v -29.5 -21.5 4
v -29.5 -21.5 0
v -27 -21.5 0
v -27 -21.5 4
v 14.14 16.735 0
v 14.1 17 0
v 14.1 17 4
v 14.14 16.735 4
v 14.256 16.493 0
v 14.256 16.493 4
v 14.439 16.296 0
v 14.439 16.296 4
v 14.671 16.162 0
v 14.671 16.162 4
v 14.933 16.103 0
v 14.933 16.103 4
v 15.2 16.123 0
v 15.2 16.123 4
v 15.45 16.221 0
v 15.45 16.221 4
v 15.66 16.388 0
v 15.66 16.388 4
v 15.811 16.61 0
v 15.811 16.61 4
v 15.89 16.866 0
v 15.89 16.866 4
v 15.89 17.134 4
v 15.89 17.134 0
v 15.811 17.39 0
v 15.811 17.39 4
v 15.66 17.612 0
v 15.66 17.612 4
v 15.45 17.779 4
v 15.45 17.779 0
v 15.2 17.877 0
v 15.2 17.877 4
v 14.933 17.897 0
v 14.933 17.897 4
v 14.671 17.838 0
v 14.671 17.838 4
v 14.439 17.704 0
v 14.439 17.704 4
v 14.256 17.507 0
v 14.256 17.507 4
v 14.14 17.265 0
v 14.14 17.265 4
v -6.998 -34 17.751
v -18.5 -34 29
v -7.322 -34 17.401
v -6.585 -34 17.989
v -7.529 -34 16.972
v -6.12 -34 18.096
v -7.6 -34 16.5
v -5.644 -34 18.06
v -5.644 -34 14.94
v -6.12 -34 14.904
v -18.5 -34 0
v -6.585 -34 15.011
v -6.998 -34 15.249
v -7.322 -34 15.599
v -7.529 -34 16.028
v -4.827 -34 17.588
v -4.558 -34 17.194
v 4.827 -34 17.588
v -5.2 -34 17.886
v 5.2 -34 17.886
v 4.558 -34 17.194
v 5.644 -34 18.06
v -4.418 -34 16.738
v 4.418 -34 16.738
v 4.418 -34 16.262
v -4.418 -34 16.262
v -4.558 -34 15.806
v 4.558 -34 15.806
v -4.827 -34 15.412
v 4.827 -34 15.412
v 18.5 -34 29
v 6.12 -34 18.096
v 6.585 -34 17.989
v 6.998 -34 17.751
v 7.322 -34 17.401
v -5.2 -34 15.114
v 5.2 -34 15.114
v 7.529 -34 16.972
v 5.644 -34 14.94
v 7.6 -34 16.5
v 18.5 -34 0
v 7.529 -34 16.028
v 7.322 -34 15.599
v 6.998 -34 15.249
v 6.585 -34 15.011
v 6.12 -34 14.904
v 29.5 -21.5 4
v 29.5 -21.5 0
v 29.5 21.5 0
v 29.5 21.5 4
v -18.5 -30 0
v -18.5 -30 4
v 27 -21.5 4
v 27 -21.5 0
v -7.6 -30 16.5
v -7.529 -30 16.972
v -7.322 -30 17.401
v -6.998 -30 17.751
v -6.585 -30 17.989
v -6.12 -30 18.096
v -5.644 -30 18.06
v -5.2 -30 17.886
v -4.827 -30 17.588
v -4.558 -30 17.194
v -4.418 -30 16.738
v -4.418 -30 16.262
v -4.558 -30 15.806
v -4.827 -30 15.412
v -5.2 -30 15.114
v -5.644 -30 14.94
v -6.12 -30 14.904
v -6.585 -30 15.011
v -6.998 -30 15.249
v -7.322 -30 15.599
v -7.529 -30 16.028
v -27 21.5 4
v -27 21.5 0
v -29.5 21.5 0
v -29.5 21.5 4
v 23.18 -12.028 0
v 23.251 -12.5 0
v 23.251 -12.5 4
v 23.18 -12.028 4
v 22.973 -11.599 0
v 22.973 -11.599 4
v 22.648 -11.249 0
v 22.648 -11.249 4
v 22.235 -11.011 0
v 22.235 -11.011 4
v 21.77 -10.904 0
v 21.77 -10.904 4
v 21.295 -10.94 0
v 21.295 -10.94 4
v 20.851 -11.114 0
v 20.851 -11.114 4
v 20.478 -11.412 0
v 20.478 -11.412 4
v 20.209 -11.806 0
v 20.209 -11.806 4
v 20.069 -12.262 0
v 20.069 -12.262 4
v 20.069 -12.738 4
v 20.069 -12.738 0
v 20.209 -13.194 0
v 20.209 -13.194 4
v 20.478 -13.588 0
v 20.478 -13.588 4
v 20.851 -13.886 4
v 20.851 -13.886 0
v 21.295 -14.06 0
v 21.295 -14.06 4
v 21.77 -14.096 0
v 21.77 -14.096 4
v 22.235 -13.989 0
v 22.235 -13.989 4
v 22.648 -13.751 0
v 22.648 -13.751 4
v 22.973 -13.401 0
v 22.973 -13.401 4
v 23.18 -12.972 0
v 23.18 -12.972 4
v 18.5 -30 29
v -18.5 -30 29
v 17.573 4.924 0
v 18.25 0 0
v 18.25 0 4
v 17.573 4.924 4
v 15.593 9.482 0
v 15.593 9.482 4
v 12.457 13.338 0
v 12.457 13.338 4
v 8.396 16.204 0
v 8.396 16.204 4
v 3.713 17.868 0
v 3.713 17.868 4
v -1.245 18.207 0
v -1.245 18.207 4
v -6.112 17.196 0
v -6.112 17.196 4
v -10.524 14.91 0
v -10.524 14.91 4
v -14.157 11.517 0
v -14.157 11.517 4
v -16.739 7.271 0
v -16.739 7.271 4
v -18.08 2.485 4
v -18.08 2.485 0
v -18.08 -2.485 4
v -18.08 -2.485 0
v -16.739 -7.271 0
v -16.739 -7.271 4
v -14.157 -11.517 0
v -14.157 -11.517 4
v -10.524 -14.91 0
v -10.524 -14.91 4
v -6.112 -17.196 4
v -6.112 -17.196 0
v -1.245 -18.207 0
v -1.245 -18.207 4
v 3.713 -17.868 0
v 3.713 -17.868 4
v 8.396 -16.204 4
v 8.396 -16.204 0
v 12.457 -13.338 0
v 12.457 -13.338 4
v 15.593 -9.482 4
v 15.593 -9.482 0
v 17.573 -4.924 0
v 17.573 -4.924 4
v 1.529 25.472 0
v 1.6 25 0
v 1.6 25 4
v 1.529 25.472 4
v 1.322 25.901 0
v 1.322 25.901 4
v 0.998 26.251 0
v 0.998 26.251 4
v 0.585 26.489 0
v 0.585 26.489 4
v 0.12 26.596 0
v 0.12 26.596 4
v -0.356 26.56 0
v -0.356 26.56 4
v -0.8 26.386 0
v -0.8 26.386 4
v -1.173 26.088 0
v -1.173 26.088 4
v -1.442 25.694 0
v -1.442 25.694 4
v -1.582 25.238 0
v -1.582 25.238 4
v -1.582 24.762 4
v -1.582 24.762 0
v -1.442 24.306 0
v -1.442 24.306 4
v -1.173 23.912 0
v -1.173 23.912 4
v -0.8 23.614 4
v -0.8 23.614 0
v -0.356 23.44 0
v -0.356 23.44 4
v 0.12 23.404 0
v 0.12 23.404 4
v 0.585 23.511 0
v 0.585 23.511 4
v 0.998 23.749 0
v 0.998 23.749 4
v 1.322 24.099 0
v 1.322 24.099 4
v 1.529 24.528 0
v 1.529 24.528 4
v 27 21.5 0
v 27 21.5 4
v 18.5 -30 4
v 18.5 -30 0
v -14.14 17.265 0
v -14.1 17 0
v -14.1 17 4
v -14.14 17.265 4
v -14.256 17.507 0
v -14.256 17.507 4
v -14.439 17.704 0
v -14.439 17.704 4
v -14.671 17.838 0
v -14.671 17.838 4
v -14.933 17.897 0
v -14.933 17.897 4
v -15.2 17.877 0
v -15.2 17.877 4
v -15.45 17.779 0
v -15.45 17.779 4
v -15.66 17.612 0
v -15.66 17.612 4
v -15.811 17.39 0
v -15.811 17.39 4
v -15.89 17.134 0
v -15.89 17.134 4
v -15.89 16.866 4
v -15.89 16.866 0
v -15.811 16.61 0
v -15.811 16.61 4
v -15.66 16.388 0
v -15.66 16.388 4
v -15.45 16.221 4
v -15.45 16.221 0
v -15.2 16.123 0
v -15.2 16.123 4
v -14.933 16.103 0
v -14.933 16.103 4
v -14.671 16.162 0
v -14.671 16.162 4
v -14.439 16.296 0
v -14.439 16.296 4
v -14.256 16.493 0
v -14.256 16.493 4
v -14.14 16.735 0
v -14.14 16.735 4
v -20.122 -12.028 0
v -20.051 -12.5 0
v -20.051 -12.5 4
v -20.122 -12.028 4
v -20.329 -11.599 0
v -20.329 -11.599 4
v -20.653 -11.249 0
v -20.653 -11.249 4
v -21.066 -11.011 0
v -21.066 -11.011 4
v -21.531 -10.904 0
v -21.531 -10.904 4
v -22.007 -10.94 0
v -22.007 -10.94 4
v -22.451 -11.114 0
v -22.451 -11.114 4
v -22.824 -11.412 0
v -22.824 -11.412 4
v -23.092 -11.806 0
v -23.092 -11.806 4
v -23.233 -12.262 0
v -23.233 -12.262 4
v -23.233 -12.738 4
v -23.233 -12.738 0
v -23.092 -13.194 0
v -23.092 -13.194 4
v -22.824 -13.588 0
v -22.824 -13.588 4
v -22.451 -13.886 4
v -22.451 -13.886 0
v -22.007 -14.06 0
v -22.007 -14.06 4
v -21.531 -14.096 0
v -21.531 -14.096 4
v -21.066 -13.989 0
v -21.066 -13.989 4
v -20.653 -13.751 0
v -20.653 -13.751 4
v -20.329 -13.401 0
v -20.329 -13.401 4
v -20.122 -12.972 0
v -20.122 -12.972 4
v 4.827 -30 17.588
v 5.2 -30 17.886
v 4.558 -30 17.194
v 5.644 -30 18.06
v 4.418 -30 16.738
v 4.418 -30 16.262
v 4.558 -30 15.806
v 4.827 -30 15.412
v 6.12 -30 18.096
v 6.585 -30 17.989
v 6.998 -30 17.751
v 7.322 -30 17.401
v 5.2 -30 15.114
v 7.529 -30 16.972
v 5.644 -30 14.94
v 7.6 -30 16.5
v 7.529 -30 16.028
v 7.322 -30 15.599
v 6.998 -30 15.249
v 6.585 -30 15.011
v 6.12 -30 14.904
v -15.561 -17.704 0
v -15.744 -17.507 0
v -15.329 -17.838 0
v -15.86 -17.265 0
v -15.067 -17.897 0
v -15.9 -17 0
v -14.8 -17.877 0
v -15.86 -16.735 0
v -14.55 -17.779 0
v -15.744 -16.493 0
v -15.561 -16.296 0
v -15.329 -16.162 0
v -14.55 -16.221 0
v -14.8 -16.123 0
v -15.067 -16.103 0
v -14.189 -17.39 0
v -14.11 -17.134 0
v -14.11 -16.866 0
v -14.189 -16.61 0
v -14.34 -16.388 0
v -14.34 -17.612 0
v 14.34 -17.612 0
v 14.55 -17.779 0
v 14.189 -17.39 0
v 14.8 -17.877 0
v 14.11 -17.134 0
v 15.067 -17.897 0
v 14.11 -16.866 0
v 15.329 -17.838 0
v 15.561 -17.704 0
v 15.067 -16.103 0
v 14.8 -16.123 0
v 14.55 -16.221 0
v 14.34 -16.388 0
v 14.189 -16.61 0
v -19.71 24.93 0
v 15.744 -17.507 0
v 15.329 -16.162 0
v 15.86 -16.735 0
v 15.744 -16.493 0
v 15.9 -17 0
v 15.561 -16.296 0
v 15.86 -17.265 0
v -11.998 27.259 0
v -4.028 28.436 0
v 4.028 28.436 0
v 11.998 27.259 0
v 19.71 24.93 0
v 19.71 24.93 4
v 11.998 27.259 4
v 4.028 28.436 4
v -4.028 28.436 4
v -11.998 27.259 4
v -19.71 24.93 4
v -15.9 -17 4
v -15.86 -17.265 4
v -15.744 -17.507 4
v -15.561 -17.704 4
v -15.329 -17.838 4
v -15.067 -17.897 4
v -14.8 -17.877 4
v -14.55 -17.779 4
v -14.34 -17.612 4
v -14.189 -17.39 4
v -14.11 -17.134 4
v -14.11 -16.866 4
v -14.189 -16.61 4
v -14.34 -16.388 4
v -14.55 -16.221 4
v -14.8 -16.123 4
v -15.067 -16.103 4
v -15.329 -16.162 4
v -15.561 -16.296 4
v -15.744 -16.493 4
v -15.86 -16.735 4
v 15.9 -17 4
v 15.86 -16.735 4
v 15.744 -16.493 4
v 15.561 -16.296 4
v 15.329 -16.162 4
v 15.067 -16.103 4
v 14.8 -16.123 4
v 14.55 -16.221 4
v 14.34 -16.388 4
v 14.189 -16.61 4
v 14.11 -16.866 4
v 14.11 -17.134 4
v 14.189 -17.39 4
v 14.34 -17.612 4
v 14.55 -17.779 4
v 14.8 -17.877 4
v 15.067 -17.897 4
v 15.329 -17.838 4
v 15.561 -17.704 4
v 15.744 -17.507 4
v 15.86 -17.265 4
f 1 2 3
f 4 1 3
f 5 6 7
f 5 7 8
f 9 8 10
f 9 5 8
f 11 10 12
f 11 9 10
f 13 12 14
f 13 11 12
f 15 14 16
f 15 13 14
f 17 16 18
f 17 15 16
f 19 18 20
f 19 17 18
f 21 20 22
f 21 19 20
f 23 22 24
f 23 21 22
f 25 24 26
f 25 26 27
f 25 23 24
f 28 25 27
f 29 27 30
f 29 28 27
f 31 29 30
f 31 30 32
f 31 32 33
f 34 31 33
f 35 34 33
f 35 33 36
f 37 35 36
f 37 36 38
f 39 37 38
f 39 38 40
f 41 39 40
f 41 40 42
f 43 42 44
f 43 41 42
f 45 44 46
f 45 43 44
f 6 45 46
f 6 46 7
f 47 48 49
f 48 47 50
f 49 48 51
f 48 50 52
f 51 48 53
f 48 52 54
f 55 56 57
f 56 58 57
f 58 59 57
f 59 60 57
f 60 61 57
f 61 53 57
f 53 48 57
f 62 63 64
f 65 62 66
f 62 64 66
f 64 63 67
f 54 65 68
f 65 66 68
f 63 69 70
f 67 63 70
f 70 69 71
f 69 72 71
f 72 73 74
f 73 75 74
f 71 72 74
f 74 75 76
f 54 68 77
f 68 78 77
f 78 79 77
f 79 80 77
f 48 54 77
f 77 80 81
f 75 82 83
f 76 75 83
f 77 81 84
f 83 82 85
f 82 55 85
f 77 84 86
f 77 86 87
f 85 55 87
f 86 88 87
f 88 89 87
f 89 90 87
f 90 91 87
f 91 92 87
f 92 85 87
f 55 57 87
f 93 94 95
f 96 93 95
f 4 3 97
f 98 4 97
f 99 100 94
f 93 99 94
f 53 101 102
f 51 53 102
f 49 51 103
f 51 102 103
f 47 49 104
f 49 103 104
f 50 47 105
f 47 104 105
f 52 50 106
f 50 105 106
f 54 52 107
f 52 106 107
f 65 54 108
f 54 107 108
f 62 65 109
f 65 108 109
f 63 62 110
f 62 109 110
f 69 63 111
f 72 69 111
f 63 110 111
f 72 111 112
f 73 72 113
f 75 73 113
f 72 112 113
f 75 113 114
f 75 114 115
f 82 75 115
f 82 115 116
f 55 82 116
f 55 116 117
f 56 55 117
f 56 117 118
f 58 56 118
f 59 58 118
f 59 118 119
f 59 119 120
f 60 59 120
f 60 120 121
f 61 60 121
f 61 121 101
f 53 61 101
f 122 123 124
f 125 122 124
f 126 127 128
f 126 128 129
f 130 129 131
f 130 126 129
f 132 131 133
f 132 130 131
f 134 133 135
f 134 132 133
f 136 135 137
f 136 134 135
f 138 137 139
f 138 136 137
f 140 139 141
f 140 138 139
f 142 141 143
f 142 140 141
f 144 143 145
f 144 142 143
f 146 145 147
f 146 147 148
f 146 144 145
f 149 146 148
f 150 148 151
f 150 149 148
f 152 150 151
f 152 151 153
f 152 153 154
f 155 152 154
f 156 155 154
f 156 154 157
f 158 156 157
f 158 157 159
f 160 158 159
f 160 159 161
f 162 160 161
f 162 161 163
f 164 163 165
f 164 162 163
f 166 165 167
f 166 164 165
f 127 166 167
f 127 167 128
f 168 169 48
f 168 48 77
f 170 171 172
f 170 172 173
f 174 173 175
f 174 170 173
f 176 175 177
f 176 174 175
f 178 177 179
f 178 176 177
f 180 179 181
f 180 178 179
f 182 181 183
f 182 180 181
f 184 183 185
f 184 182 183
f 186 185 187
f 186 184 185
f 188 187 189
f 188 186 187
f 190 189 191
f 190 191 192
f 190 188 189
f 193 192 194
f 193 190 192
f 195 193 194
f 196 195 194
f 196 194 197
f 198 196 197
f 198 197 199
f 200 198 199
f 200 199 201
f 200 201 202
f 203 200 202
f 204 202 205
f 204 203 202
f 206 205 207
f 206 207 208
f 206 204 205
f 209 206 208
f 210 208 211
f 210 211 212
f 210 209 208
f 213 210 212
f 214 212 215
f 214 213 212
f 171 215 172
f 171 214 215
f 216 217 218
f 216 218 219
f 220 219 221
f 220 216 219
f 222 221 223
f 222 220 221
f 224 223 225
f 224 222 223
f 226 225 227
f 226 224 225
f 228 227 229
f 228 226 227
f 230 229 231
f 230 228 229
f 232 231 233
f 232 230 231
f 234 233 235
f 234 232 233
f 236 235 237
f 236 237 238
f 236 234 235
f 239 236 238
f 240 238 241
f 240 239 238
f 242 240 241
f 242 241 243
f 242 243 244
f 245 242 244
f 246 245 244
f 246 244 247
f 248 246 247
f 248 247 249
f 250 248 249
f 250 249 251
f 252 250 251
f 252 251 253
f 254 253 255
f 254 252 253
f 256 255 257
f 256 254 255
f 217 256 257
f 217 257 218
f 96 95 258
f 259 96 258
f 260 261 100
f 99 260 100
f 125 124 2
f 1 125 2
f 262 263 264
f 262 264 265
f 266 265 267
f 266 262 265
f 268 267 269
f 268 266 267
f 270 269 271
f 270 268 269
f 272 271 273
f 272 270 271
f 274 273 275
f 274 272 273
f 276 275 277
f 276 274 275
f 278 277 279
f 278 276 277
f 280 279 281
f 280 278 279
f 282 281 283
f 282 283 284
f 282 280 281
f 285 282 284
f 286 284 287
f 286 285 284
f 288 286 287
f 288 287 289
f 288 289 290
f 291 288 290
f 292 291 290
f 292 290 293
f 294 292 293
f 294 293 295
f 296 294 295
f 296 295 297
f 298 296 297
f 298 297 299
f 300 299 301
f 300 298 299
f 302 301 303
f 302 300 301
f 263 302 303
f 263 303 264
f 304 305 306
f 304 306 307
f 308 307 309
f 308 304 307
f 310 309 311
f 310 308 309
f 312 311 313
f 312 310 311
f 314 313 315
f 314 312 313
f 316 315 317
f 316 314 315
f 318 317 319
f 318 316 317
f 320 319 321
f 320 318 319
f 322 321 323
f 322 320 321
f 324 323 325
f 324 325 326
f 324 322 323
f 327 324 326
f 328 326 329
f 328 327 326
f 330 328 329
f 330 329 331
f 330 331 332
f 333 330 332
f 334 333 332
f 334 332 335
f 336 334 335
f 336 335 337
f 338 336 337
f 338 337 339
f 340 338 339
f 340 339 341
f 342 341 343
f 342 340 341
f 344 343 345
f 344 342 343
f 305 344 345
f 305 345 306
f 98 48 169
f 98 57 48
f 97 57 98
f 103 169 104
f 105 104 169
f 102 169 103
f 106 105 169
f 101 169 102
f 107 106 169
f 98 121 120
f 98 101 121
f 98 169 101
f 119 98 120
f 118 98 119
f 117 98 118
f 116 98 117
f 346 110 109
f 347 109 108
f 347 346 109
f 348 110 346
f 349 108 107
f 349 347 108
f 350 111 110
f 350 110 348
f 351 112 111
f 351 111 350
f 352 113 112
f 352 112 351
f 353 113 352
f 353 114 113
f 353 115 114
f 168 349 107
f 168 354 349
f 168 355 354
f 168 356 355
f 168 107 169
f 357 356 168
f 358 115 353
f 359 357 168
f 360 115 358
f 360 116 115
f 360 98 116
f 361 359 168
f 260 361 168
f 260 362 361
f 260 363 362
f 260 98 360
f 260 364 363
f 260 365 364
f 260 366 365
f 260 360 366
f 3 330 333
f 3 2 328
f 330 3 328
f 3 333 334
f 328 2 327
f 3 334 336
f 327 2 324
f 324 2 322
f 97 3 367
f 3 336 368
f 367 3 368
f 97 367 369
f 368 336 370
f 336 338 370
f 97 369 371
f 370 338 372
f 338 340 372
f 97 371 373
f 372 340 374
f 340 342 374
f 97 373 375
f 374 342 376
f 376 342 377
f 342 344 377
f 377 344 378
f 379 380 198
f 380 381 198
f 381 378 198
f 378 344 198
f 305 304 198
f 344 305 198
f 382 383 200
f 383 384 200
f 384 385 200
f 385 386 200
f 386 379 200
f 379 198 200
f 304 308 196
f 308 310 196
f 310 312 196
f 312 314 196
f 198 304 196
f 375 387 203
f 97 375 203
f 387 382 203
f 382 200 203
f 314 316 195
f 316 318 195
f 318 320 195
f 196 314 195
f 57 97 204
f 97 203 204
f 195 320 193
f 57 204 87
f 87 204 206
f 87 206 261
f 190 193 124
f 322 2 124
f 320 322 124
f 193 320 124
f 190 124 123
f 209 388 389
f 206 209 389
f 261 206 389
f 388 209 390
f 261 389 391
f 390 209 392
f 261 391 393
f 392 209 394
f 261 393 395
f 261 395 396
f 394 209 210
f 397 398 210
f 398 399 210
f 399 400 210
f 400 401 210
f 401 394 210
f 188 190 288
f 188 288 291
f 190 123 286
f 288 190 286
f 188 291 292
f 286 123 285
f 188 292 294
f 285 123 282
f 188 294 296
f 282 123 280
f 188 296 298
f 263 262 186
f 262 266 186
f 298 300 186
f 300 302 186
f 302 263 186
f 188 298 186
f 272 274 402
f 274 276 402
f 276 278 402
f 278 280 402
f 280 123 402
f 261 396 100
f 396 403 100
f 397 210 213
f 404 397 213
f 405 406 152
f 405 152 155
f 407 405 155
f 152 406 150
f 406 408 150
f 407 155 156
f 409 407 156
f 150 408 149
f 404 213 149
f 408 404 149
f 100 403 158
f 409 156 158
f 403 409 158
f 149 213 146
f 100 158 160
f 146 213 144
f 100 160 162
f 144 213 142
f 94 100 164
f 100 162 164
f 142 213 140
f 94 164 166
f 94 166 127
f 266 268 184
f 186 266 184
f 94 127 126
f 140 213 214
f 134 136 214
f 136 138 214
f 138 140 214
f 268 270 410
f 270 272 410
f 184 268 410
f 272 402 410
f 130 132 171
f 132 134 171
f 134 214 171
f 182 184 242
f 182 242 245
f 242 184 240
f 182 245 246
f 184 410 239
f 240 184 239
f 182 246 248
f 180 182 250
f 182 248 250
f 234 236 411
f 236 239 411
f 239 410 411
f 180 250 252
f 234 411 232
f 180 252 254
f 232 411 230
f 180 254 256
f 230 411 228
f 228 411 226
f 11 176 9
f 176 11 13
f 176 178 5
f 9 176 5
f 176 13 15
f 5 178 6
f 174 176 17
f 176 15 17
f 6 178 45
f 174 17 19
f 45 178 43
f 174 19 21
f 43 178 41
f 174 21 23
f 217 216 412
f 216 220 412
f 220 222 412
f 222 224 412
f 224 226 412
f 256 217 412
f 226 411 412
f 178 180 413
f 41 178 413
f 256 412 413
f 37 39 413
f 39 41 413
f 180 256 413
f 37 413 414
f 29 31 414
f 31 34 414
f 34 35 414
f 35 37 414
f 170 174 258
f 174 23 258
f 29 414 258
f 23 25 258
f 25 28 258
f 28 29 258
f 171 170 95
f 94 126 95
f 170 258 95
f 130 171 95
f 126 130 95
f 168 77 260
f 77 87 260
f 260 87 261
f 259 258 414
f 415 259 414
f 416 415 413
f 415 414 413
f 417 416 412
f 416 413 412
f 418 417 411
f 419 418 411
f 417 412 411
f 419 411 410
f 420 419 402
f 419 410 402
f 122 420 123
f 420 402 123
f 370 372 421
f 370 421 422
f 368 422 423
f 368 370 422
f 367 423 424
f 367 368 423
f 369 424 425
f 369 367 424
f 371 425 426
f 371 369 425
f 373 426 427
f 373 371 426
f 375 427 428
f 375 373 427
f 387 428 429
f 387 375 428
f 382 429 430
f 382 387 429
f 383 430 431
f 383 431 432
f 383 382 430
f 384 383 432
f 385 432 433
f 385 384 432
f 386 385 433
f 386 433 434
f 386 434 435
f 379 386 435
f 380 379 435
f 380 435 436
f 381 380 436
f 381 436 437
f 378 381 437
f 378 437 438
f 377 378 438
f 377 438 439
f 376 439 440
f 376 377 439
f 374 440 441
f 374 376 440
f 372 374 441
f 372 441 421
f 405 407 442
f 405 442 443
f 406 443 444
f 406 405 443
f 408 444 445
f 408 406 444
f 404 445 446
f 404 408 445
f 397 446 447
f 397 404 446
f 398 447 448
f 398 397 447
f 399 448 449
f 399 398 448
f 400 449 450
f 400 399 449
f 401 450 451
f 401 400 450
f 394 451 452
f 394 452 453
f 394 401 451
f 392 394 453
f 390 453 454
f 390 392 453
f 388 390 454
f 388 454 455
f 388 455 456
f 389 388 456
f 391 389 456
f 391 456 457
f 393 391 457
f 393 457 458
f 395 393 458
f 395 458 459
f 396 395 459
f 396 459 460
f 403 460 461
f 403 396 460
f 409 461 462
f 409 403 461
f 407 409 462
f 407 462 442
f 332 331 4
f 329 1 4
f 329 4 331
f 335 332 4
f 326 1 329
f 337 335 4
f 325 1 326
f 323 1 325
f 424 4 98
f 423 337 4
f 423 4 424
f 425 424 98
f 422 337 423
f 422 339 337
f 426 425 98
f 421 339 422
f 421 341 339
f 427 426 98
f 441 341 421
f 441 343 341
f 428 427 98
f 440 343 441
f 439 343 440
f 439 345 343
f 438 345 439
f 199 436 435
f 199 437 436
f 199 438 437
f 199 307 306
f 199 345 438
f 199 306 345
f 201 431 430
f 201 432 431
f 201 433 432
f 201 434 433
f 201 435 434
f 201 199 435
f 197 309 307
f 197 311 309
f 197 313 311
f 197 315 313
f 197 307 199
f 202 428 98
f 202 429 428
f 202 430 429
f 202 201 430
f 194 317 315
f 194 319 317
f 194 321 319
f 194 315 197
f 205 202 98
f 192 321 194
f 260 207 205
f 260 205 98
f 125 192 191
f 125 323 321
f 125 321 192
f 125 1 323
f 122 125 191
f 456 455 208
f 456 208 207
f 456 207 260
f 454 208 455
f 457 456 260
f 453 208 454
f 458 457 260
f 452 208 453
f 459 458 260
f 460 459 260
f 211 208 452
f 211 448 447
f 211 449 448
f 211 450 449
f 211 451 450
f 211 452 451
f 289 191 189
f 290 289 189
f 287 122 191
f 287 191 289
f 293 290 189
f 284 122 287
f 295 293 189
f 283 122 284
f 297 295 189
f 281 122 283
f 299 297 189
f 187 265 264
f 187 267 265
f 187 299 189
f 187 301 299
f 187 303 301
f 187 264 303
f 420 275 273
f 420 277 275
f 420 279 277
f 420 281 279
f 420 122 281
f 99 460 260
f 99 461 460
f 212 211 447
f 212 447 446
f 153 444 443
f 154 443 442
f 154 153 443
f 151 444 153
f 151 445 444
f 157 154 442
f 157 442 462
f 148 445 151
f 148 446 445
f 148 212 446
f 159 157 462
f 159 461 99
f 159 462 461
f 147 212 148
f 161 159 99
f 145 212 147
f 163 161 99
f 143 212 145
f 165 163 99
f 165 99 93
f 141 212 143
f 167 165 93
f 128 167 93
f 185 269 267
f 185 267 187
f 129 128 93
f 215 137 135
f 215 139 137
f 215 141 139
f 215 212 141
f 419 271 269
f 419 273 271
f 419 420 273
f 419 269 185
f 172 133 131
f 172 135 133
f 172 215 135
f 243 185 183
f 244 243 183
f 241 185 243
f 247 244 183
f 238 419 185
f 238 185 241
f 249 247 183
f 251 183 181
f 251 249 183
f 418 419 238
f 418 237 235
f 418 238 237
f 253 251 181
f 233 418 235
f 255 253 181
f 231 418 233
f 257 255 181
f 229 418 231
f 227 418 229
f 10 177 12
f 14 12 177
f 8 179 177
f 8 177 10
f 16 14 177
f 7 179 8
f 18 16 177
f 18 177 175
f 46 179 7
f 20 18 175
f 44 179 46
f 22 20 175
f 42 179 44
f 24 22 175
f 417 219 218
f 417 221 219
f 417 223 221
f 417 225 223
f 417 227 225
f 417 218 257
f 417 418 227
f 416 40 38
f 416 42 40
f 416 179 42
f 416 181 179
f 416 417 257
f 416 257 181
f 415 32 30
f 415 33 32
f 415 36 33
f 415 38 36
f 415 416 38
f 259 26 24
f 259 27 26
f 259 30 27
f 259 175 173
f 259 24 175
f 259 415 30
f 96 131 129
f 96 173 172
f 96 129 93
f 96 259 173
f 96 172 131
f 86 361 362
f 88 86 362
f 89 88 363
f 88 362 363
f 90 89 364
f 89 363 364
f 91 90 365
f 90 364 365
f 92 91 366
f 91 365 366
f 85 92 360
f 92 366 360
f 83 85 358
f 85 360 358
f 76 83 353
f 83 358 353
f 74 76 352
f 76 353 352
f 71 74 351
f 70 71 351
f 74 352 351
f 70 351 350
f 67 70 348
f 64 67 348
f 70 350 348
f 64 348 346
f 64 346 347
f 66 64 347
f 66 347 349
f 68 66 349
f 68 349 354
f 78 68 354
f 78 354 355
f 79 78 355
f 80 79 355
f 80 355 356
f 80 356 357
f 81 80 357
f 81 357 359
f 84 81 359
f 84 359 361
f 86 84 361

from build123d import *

# Parameters (mm, degrees)
SKETCH_1_R          = 18.25
SKETCH_1_R_2        = 1.6
SKETCH_1_R_3        = 0.9
EXTRUDE_1_DEPTH     = 4
SKETCH_2_W          = 37
SKETCH_2_H          = 4
EXTRUDE_2_DEPTH     = 25
SKETCH_3_R          = 1.6
CUT_EXTRUDE_1_DEPTH = 72.716563183


with BuildPart() as part:
    # 草图1 → 凸台-拉伸1 (new body)
    with BuildSketch(Plane.XY):
        with BuildLine():
            Line((-18.5, -34), (18.5, -34))
            Line((18.5, -34), (18.5, -30))
            Line((18.5, -30), (27, -21.5))
            Line((27, -21.5), (29.5, -21.5))
            Line((29.5, -21.5), (29.5, 21.5))
            Line((29.5, 21.5), (27, 21.5))
            ThreePointArc((27, 21.5), (0, 28.583405797), (-27, 21.5))
            Line((-27, 21.5), (-29.5, 21.5))
            Line((-29.5, 21.5), (-29.5, -21.5))
            Line((-29.5, -21.5), (-27, -21.5))
            Line((-27, -21.5), (-18.5, -30))
            Line((-18.5, -30), (-18.5, -34))
        make_face()
        Circle(SKETCH_1_R, mode=Mode.SUBTRACT)
        with Locations((0, 25)):
            Circle(SKETCH_1_R_2, mode=Mode.SUBTRACT)
        with Locations((21.650635095, -12.5)):
            Circle(SKETCH_1_R_2, mode=Mode.SUBTRACT)
        with Locations((-21.650635095, -12.5)):
            Circle(SKETCH_1_R_2, mode=Mode.SUBTRACT)
        with Locations((-15, 17)):
            Circle(SKETCH_1_R_3, mode=Mode.SUBTRACT)
        with Locations(Location((15, 17, 0), (0, 0, 180))):
            Circle(SKETCH_1_R_3, mode=Mode.SUBTRACT)
        with Locations((15, -17)):
            Circle(SKETCH_1_R_3, mode=Mode.SUBTRACT)
        with Locations(Location((-15, -17, 0), (0, 0, 180))):
            Circle(SKETCH_1_R_3, mode=Mode.SUBTRACT)
    extrude(amount=EXTRUDE_1_DEPTH)

    # 草图2 → 凸台-拉伸2 (add)
    with BuildSketch(Plane.XY.offset(4)):
        with Locations((0, -32)):
            Rectangle(SKETCH_2_W, SKETCH_2_H)
    extrude(amount=EXTRUDE_2_DEPTH)

    # 草图3 → 切除-拉伸1 (cut, through all)
    with BuildSketch(Plane(origin=(0, -30, 0), x_dir=(1, 0, 0), z_dir=(0, 1, 0))):
        with Locations(Location((-6, -16.5, 0), (0, 0, 180))):
            Circle(SKETCH_3_R)
        with Locations((6, -16.5)):
            Circle(SKETCH_3_R)
    extrude(amount=-CUT_EXTRUDE_1_DEPTH, mode=Mode.SUBTRACT)


solid = part.part
